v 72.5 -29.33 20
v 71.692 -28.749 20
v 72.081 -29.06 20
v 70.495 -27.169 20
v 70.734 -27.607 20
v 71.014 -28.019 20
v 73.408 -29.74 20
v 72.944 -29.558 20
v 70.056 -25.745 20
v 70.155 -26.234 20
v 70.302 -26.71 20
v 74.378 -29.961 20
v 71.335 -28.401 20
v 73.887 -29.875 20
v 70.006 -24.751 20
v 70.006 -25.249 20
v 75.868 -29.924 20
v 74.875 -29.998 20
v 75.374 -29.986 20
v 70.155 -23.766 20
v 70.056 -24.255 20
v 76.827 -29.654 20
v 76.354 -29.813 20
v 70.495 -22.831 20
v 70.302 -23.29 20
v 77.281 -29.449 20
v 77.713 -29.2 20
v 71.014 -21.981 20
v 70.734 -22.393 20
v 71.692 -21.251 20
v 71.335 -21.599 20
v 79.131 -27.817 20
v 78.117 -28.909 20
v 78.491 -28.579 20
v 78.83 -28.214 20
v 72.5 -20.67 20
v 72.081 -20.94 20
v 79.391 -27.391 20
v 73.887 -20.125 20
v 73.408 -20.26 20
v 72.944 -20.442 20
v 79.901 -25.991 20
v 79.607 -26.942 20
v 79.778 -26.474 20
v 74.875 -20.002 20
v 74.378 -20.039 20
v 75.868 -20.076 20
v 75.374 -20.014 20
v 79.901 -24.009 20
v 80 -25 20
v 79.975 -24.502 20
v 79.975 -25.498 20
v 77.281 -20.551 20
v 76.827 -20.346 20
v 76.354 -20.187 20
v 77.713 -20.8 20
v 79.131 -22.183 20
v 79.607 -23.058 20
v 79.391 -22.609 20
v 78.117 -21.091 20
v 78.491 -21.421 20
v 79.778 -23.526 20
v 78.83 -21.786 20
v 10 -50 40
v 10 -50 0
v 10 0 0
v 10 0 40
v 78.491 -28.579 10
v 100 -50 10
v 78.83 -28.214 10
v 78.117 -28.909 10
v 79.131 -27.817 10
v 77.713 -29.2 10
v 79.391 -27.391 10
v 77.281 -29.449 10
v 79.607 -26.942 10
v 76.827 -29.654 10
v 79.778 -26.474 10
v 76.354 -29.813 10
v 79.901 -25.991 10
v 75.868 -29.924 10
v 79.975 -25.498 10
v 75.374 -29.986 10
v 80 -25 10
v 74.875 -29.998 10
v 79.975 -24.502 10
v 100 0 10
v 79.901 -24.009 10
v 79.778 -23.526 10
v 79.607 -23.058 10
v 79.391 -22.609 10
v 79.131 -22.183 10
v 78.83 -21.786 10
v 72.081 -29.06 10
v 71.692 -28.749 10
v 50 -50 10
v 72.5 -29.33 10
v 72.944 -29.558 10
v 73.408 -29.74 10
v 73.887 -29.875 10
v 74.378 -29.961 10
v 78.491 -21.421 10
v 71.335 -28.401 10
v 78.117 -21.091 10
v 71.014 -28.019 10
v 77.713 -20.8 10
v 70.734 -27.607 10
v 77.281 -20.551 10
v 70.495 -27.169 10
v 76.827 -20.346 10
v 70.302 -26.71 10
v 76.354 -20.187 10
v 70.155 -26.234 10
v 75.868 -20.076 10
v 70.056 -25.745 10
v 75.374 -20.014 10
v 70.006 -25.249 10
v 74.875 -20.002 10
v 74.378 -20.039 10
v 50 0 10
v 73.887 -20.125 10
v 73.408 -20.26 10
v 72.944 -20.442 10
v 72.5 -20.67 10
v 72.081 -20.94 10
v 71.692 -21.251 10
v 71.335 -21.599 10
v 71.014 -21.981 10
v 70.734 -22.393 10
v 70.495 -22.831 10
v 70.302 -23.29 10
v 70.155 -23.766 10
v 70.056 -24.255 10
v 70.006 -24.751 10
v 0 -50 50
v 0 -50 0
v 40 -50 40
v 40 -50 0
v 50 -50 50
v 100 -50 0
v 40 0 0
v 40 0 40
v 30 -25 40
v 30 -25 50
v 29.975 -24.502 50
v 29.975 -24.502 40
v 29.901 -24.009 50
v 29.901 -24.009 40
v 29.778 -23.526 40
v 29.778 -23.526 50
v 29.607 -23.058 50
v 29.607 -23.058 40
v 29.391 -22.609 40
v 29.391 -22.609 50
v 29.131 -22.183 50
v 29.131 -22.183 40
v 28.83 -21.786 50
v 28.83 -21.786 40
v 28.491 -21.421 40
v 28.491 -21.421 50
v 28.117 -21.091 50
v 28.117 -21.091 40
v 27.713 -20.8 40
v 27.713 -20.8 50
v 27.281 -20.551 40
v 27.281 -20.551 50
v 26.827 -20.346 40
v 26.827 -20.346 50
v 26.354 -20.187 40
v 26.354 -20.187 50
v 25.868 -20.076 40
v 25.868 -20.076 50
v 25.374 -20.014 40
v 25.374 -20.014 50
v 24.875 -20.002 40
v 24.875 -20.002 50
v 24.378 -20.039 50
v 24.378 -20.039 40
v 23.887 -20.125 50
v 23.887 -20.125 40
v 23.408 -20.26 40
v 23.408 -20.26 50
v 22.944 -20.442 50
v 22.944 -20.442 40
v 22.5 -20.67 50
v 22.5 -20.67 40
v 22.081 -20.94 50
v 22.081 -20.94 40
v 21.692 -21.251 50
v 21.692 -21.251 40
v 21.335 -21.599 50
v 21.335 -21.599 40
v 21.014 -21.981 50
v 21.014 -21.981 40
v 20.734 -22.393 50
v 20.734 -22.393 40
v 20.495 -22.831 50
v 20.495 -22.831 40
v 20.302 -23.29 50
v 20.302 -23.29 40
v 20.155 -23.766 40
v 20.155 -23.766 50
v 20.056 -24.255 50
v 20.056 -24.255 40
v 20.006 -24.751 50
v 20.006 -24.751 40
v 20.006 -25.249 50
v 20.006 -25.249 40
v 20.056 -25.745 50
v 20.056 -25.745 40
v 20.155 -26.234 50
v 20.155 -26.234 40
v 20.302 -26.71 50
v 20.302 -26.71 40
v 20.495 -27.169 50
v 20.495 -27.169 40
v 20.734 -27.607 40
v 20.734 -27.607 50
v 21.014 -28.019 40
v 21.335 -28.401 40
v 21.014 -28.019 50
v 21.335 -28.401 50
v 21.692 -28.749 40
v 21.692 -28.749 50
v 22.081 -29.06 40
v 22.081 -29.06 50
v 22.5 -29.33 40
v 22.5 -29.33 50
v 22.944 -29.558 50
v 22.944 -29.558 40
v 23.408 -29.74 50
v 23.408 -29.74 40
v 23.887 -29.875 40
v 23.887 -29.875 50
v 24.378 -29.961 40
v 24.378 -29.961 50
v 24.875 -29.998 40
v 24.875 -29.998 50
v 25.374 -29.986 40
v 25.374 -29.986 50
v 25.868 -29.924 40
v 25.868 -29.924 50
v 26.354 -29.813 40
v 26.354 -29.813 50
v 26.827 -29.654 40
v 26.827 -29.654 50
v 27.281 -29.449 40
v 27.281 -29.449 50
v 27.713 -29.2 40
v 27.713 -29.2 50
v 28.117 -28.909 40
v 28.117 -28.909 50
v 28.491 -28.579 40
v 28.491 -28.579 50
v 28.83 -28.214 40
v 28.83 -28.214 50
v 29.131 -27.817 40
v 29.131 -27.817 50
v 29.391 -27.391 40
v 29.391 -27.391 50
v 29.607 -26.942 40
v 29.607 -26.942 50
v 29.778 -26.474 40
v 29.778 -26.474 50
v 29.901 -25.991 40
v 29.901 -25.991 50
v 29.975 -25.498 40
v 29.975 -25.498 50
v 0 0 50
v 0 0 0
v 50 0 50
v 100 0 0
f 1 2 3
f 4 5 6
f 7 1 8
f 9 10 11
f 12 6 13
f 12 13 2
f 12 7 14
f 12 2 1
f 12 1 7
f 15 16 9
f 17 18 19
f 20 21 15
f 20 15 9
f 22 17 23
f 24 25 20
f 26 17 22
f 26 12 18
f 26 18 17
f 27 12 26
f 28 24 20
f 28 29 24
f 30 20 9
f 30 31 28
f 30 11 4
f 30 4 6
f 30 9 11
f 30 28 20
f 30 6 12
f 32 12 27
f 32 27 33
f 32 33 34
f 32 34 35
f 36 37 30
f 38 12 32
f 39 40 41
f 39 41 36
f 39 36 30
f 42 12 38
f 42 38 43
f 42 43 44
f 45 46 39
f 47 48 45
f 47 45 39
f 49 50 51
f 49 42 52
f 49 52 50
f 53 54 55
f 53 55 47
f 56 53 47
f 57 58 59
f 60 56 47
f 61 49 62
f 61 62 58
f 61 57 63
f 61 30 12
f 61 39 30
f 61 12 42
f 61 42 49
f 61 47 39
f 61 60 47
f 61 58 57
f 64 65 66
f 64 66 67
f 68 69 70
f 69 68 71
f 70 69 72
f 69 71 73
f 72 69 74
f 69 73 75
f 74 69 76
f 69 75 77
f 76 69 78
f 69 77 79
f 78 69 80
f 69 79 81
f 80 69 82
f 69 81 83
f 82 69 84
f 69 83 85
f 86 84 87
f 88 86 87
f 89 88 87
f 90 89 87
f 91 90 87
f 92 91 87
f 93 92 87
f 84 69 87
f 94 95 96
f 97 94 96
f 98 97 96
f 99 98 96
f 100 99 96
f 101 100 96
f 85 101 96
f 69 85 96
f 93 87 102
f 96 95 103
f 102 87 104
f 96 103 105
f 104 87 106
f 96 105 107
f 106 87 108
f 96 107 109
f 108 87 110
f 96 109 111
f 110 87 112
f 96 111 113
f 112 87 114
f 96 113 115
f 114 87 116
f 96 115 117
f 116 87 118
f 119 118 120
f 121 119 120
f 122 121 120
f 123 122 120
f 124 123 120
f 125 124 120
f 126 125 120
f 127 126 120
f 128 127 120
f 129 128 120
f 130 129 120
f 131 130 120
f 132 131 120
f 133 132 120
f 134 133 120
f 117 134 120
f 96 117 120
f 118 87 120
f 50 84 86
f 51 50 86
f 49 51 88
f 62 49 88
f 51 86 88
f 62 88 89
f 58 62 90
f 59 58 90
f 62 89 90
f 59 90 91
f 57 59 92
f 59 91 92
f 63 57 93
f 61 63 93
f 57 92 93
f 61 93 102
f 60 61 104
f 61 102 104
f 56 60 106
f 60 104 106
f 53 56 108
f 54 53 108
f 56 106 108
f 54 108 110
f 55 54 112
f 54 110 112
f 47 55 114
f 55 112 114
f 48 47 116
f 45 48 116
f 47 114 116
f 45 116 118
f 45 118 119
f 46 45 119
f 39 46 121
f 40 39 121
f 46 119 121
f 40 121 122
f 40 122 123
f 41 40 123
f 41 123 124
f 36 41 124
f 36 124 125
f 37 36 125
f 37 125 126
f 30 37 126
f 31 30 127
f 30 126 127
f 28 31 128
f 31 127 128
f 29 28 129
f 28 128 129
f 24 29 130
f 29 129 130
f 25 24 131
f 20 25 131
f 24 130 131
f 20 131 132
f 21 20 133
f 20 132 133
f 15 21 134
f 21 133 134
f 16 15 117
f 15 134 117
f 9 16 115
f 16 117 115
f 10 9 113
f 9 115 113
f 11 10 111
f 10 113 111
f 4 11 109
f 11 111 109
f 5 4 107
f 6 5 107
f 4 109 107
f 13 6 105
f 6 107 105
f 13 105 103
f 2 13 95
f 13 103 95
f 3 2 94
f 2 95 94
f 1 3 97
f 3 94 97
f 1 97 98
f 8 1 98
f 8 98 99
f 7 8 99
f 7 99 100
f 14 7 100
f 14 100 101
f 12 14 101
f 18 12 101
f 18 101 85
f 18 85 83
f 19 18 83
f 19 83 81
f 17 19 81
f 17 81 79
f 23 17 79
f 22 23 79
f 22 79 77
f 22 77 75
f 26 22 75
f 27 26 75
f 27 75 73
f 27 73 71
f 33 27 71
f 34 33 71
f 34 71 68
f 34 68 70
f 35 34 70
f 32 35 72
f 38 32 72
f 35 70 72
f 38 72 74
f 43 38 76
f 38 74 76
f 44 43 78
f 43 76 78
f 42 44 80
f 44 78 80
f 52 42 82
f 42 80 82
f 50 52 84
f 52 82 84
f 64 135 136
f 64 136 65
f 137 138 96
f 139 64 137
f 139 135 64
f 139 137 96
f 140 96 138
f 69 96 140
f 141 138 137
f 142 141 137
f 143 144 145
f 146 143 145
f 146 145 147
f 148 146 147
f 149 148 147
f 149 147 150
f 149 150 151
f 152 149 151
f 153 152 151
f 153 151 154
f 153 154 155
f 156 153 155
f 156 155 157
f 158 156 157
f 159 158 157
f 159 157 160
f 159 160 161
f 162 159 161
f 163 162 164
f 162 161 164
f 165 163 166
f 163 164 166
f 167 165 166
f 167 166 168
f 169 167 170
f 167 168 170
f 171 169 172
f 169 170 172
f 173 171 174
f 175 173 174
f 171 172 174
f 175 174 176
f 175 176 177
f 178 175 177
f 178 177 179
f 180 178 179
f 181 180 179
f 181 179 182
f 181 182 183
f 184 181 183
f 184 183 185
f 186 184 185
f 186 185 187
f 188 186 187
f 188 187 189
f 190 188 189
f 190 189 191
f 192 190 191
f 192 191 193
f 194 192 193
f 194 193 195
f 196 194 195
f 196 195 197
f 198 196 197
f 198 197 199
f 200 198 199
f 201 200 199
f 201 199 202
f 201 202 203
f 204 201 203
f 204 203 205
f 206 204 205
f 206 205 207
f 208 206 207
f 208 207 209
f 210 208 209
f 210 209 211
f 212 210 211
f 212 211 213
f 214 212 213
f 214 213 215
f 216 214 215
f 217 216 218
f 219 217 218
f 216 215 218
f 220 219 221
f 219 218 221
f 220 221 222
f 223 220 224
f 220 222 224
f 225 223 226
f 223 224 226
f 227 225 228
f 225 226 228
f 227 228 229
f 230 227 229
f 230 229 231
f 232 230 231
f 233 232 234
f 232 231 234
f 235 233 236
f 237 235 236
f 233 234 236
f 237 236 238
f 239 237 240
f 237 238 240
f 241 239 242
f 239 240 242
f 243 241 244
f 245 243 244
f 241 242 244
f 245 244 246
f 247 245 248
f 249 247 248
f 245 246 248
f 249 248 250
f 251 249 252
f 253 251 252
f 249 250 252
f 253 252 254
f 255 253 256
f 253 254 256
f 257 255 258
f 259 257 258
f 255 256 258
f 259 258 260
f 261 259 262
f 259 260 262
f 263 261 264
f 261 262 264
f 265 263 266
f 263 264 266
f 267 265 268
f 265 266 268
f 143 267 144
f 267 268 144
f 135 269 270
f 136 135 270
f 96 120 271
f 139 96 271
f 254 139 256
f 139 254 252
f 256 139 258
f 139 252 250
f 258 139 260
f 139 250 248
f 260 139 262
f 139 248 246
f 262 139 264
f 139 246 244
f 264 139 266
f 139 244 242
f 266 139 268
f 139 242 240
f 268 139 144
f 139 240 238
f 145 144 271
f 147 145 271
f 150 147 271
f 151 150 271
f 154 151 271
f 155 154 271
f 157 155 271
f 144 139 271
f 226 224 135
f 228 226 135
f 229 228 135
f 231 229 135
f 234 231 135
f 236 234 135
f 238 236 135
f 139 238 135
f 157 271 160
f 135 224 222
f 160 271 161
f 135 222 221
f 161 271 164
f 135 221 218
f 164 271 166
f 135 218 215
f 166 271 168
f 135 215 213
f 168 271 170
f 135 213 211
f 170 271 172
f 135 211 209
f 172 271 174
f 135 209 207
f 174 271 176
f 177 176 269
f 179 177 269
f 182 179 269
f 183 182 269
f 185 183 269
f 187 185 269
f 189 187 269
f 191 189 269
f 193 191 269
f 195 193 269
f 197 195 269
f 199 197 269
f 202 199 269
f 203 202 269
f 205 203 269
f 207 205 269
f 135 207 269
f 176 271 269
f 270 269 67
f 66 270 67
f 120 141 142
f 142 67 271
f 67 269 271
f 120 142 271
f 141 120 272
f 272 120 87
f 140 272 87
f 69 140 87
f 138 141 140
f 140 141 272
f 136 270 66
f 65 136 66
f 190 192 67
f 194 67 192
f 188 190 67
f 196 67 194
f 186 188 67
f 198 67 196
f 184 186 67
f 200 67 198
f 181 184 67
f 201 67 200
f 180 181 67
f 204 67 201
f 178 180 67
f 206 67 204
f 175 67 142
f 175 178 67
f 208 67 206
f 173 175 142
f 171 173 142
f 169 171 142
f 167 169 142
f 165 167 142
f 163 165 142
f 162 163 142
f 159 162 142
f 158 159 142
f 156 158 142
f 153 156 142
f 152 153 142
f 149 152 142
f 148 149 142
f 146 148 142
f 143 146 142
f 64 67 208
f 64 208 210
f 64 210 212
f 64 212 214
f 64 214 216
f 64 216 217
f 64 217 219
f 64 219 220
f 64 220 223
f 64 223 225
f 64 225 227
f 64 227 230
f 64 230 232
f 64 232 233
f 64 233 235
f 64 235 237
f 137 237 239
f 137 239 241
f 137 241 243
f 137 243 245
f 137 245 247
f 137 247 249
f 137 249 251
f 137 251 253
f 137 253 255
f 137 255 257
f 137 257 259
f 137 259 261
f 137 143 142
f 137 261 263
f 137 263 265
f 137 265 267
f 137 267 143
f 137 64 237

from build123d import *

# Parameters (mm, degrees)
F1_DEPTH = 50
F2_W     = 30
F2_H     = 40
F3_DEPTH = 50.001
F4_R     = 5
F5_DEPTH = 50.001
F6_R     = 5
F7_DEPTH = 10


with BuildPart() as f1:
    # F0 (on Front) → F1 (new body)
    with BuildSketch(Plane.XZ):
        Polygon((0, 50), (0, 0), (100, 0), (100, 10), (50, 10), (50, 50), align=None)
    extrude(amount=F1_DEPTH)

    # F2 (on face) → F3 (cut, through all)
    with BuildSketch(Plane.XZ.offset(50)):
        with Locations((25, 20)):
            Rectangle(F2_W, F2_H)
    extrude(amount=-F3_DEPTH, mode=Mode.SUBTRACT)

    # F4 (on face) → F5 (cut, through all)
    with BuildSketch(Plane.XY.offset(50)):
        with Locations((25, -25)):
            Circle(F4_R)
    extrude(amount=-F5_DEPTH, mode=Mode.SUBTRACT)

    # F6 (on face) → F7 (join)
    with BuildSketch(Plane.XY.offset(10)):
        with Locations((75, -25)):
            Circle(F6_R)
    extrude(amount=F7_DEPTH)


solid = f1.part
